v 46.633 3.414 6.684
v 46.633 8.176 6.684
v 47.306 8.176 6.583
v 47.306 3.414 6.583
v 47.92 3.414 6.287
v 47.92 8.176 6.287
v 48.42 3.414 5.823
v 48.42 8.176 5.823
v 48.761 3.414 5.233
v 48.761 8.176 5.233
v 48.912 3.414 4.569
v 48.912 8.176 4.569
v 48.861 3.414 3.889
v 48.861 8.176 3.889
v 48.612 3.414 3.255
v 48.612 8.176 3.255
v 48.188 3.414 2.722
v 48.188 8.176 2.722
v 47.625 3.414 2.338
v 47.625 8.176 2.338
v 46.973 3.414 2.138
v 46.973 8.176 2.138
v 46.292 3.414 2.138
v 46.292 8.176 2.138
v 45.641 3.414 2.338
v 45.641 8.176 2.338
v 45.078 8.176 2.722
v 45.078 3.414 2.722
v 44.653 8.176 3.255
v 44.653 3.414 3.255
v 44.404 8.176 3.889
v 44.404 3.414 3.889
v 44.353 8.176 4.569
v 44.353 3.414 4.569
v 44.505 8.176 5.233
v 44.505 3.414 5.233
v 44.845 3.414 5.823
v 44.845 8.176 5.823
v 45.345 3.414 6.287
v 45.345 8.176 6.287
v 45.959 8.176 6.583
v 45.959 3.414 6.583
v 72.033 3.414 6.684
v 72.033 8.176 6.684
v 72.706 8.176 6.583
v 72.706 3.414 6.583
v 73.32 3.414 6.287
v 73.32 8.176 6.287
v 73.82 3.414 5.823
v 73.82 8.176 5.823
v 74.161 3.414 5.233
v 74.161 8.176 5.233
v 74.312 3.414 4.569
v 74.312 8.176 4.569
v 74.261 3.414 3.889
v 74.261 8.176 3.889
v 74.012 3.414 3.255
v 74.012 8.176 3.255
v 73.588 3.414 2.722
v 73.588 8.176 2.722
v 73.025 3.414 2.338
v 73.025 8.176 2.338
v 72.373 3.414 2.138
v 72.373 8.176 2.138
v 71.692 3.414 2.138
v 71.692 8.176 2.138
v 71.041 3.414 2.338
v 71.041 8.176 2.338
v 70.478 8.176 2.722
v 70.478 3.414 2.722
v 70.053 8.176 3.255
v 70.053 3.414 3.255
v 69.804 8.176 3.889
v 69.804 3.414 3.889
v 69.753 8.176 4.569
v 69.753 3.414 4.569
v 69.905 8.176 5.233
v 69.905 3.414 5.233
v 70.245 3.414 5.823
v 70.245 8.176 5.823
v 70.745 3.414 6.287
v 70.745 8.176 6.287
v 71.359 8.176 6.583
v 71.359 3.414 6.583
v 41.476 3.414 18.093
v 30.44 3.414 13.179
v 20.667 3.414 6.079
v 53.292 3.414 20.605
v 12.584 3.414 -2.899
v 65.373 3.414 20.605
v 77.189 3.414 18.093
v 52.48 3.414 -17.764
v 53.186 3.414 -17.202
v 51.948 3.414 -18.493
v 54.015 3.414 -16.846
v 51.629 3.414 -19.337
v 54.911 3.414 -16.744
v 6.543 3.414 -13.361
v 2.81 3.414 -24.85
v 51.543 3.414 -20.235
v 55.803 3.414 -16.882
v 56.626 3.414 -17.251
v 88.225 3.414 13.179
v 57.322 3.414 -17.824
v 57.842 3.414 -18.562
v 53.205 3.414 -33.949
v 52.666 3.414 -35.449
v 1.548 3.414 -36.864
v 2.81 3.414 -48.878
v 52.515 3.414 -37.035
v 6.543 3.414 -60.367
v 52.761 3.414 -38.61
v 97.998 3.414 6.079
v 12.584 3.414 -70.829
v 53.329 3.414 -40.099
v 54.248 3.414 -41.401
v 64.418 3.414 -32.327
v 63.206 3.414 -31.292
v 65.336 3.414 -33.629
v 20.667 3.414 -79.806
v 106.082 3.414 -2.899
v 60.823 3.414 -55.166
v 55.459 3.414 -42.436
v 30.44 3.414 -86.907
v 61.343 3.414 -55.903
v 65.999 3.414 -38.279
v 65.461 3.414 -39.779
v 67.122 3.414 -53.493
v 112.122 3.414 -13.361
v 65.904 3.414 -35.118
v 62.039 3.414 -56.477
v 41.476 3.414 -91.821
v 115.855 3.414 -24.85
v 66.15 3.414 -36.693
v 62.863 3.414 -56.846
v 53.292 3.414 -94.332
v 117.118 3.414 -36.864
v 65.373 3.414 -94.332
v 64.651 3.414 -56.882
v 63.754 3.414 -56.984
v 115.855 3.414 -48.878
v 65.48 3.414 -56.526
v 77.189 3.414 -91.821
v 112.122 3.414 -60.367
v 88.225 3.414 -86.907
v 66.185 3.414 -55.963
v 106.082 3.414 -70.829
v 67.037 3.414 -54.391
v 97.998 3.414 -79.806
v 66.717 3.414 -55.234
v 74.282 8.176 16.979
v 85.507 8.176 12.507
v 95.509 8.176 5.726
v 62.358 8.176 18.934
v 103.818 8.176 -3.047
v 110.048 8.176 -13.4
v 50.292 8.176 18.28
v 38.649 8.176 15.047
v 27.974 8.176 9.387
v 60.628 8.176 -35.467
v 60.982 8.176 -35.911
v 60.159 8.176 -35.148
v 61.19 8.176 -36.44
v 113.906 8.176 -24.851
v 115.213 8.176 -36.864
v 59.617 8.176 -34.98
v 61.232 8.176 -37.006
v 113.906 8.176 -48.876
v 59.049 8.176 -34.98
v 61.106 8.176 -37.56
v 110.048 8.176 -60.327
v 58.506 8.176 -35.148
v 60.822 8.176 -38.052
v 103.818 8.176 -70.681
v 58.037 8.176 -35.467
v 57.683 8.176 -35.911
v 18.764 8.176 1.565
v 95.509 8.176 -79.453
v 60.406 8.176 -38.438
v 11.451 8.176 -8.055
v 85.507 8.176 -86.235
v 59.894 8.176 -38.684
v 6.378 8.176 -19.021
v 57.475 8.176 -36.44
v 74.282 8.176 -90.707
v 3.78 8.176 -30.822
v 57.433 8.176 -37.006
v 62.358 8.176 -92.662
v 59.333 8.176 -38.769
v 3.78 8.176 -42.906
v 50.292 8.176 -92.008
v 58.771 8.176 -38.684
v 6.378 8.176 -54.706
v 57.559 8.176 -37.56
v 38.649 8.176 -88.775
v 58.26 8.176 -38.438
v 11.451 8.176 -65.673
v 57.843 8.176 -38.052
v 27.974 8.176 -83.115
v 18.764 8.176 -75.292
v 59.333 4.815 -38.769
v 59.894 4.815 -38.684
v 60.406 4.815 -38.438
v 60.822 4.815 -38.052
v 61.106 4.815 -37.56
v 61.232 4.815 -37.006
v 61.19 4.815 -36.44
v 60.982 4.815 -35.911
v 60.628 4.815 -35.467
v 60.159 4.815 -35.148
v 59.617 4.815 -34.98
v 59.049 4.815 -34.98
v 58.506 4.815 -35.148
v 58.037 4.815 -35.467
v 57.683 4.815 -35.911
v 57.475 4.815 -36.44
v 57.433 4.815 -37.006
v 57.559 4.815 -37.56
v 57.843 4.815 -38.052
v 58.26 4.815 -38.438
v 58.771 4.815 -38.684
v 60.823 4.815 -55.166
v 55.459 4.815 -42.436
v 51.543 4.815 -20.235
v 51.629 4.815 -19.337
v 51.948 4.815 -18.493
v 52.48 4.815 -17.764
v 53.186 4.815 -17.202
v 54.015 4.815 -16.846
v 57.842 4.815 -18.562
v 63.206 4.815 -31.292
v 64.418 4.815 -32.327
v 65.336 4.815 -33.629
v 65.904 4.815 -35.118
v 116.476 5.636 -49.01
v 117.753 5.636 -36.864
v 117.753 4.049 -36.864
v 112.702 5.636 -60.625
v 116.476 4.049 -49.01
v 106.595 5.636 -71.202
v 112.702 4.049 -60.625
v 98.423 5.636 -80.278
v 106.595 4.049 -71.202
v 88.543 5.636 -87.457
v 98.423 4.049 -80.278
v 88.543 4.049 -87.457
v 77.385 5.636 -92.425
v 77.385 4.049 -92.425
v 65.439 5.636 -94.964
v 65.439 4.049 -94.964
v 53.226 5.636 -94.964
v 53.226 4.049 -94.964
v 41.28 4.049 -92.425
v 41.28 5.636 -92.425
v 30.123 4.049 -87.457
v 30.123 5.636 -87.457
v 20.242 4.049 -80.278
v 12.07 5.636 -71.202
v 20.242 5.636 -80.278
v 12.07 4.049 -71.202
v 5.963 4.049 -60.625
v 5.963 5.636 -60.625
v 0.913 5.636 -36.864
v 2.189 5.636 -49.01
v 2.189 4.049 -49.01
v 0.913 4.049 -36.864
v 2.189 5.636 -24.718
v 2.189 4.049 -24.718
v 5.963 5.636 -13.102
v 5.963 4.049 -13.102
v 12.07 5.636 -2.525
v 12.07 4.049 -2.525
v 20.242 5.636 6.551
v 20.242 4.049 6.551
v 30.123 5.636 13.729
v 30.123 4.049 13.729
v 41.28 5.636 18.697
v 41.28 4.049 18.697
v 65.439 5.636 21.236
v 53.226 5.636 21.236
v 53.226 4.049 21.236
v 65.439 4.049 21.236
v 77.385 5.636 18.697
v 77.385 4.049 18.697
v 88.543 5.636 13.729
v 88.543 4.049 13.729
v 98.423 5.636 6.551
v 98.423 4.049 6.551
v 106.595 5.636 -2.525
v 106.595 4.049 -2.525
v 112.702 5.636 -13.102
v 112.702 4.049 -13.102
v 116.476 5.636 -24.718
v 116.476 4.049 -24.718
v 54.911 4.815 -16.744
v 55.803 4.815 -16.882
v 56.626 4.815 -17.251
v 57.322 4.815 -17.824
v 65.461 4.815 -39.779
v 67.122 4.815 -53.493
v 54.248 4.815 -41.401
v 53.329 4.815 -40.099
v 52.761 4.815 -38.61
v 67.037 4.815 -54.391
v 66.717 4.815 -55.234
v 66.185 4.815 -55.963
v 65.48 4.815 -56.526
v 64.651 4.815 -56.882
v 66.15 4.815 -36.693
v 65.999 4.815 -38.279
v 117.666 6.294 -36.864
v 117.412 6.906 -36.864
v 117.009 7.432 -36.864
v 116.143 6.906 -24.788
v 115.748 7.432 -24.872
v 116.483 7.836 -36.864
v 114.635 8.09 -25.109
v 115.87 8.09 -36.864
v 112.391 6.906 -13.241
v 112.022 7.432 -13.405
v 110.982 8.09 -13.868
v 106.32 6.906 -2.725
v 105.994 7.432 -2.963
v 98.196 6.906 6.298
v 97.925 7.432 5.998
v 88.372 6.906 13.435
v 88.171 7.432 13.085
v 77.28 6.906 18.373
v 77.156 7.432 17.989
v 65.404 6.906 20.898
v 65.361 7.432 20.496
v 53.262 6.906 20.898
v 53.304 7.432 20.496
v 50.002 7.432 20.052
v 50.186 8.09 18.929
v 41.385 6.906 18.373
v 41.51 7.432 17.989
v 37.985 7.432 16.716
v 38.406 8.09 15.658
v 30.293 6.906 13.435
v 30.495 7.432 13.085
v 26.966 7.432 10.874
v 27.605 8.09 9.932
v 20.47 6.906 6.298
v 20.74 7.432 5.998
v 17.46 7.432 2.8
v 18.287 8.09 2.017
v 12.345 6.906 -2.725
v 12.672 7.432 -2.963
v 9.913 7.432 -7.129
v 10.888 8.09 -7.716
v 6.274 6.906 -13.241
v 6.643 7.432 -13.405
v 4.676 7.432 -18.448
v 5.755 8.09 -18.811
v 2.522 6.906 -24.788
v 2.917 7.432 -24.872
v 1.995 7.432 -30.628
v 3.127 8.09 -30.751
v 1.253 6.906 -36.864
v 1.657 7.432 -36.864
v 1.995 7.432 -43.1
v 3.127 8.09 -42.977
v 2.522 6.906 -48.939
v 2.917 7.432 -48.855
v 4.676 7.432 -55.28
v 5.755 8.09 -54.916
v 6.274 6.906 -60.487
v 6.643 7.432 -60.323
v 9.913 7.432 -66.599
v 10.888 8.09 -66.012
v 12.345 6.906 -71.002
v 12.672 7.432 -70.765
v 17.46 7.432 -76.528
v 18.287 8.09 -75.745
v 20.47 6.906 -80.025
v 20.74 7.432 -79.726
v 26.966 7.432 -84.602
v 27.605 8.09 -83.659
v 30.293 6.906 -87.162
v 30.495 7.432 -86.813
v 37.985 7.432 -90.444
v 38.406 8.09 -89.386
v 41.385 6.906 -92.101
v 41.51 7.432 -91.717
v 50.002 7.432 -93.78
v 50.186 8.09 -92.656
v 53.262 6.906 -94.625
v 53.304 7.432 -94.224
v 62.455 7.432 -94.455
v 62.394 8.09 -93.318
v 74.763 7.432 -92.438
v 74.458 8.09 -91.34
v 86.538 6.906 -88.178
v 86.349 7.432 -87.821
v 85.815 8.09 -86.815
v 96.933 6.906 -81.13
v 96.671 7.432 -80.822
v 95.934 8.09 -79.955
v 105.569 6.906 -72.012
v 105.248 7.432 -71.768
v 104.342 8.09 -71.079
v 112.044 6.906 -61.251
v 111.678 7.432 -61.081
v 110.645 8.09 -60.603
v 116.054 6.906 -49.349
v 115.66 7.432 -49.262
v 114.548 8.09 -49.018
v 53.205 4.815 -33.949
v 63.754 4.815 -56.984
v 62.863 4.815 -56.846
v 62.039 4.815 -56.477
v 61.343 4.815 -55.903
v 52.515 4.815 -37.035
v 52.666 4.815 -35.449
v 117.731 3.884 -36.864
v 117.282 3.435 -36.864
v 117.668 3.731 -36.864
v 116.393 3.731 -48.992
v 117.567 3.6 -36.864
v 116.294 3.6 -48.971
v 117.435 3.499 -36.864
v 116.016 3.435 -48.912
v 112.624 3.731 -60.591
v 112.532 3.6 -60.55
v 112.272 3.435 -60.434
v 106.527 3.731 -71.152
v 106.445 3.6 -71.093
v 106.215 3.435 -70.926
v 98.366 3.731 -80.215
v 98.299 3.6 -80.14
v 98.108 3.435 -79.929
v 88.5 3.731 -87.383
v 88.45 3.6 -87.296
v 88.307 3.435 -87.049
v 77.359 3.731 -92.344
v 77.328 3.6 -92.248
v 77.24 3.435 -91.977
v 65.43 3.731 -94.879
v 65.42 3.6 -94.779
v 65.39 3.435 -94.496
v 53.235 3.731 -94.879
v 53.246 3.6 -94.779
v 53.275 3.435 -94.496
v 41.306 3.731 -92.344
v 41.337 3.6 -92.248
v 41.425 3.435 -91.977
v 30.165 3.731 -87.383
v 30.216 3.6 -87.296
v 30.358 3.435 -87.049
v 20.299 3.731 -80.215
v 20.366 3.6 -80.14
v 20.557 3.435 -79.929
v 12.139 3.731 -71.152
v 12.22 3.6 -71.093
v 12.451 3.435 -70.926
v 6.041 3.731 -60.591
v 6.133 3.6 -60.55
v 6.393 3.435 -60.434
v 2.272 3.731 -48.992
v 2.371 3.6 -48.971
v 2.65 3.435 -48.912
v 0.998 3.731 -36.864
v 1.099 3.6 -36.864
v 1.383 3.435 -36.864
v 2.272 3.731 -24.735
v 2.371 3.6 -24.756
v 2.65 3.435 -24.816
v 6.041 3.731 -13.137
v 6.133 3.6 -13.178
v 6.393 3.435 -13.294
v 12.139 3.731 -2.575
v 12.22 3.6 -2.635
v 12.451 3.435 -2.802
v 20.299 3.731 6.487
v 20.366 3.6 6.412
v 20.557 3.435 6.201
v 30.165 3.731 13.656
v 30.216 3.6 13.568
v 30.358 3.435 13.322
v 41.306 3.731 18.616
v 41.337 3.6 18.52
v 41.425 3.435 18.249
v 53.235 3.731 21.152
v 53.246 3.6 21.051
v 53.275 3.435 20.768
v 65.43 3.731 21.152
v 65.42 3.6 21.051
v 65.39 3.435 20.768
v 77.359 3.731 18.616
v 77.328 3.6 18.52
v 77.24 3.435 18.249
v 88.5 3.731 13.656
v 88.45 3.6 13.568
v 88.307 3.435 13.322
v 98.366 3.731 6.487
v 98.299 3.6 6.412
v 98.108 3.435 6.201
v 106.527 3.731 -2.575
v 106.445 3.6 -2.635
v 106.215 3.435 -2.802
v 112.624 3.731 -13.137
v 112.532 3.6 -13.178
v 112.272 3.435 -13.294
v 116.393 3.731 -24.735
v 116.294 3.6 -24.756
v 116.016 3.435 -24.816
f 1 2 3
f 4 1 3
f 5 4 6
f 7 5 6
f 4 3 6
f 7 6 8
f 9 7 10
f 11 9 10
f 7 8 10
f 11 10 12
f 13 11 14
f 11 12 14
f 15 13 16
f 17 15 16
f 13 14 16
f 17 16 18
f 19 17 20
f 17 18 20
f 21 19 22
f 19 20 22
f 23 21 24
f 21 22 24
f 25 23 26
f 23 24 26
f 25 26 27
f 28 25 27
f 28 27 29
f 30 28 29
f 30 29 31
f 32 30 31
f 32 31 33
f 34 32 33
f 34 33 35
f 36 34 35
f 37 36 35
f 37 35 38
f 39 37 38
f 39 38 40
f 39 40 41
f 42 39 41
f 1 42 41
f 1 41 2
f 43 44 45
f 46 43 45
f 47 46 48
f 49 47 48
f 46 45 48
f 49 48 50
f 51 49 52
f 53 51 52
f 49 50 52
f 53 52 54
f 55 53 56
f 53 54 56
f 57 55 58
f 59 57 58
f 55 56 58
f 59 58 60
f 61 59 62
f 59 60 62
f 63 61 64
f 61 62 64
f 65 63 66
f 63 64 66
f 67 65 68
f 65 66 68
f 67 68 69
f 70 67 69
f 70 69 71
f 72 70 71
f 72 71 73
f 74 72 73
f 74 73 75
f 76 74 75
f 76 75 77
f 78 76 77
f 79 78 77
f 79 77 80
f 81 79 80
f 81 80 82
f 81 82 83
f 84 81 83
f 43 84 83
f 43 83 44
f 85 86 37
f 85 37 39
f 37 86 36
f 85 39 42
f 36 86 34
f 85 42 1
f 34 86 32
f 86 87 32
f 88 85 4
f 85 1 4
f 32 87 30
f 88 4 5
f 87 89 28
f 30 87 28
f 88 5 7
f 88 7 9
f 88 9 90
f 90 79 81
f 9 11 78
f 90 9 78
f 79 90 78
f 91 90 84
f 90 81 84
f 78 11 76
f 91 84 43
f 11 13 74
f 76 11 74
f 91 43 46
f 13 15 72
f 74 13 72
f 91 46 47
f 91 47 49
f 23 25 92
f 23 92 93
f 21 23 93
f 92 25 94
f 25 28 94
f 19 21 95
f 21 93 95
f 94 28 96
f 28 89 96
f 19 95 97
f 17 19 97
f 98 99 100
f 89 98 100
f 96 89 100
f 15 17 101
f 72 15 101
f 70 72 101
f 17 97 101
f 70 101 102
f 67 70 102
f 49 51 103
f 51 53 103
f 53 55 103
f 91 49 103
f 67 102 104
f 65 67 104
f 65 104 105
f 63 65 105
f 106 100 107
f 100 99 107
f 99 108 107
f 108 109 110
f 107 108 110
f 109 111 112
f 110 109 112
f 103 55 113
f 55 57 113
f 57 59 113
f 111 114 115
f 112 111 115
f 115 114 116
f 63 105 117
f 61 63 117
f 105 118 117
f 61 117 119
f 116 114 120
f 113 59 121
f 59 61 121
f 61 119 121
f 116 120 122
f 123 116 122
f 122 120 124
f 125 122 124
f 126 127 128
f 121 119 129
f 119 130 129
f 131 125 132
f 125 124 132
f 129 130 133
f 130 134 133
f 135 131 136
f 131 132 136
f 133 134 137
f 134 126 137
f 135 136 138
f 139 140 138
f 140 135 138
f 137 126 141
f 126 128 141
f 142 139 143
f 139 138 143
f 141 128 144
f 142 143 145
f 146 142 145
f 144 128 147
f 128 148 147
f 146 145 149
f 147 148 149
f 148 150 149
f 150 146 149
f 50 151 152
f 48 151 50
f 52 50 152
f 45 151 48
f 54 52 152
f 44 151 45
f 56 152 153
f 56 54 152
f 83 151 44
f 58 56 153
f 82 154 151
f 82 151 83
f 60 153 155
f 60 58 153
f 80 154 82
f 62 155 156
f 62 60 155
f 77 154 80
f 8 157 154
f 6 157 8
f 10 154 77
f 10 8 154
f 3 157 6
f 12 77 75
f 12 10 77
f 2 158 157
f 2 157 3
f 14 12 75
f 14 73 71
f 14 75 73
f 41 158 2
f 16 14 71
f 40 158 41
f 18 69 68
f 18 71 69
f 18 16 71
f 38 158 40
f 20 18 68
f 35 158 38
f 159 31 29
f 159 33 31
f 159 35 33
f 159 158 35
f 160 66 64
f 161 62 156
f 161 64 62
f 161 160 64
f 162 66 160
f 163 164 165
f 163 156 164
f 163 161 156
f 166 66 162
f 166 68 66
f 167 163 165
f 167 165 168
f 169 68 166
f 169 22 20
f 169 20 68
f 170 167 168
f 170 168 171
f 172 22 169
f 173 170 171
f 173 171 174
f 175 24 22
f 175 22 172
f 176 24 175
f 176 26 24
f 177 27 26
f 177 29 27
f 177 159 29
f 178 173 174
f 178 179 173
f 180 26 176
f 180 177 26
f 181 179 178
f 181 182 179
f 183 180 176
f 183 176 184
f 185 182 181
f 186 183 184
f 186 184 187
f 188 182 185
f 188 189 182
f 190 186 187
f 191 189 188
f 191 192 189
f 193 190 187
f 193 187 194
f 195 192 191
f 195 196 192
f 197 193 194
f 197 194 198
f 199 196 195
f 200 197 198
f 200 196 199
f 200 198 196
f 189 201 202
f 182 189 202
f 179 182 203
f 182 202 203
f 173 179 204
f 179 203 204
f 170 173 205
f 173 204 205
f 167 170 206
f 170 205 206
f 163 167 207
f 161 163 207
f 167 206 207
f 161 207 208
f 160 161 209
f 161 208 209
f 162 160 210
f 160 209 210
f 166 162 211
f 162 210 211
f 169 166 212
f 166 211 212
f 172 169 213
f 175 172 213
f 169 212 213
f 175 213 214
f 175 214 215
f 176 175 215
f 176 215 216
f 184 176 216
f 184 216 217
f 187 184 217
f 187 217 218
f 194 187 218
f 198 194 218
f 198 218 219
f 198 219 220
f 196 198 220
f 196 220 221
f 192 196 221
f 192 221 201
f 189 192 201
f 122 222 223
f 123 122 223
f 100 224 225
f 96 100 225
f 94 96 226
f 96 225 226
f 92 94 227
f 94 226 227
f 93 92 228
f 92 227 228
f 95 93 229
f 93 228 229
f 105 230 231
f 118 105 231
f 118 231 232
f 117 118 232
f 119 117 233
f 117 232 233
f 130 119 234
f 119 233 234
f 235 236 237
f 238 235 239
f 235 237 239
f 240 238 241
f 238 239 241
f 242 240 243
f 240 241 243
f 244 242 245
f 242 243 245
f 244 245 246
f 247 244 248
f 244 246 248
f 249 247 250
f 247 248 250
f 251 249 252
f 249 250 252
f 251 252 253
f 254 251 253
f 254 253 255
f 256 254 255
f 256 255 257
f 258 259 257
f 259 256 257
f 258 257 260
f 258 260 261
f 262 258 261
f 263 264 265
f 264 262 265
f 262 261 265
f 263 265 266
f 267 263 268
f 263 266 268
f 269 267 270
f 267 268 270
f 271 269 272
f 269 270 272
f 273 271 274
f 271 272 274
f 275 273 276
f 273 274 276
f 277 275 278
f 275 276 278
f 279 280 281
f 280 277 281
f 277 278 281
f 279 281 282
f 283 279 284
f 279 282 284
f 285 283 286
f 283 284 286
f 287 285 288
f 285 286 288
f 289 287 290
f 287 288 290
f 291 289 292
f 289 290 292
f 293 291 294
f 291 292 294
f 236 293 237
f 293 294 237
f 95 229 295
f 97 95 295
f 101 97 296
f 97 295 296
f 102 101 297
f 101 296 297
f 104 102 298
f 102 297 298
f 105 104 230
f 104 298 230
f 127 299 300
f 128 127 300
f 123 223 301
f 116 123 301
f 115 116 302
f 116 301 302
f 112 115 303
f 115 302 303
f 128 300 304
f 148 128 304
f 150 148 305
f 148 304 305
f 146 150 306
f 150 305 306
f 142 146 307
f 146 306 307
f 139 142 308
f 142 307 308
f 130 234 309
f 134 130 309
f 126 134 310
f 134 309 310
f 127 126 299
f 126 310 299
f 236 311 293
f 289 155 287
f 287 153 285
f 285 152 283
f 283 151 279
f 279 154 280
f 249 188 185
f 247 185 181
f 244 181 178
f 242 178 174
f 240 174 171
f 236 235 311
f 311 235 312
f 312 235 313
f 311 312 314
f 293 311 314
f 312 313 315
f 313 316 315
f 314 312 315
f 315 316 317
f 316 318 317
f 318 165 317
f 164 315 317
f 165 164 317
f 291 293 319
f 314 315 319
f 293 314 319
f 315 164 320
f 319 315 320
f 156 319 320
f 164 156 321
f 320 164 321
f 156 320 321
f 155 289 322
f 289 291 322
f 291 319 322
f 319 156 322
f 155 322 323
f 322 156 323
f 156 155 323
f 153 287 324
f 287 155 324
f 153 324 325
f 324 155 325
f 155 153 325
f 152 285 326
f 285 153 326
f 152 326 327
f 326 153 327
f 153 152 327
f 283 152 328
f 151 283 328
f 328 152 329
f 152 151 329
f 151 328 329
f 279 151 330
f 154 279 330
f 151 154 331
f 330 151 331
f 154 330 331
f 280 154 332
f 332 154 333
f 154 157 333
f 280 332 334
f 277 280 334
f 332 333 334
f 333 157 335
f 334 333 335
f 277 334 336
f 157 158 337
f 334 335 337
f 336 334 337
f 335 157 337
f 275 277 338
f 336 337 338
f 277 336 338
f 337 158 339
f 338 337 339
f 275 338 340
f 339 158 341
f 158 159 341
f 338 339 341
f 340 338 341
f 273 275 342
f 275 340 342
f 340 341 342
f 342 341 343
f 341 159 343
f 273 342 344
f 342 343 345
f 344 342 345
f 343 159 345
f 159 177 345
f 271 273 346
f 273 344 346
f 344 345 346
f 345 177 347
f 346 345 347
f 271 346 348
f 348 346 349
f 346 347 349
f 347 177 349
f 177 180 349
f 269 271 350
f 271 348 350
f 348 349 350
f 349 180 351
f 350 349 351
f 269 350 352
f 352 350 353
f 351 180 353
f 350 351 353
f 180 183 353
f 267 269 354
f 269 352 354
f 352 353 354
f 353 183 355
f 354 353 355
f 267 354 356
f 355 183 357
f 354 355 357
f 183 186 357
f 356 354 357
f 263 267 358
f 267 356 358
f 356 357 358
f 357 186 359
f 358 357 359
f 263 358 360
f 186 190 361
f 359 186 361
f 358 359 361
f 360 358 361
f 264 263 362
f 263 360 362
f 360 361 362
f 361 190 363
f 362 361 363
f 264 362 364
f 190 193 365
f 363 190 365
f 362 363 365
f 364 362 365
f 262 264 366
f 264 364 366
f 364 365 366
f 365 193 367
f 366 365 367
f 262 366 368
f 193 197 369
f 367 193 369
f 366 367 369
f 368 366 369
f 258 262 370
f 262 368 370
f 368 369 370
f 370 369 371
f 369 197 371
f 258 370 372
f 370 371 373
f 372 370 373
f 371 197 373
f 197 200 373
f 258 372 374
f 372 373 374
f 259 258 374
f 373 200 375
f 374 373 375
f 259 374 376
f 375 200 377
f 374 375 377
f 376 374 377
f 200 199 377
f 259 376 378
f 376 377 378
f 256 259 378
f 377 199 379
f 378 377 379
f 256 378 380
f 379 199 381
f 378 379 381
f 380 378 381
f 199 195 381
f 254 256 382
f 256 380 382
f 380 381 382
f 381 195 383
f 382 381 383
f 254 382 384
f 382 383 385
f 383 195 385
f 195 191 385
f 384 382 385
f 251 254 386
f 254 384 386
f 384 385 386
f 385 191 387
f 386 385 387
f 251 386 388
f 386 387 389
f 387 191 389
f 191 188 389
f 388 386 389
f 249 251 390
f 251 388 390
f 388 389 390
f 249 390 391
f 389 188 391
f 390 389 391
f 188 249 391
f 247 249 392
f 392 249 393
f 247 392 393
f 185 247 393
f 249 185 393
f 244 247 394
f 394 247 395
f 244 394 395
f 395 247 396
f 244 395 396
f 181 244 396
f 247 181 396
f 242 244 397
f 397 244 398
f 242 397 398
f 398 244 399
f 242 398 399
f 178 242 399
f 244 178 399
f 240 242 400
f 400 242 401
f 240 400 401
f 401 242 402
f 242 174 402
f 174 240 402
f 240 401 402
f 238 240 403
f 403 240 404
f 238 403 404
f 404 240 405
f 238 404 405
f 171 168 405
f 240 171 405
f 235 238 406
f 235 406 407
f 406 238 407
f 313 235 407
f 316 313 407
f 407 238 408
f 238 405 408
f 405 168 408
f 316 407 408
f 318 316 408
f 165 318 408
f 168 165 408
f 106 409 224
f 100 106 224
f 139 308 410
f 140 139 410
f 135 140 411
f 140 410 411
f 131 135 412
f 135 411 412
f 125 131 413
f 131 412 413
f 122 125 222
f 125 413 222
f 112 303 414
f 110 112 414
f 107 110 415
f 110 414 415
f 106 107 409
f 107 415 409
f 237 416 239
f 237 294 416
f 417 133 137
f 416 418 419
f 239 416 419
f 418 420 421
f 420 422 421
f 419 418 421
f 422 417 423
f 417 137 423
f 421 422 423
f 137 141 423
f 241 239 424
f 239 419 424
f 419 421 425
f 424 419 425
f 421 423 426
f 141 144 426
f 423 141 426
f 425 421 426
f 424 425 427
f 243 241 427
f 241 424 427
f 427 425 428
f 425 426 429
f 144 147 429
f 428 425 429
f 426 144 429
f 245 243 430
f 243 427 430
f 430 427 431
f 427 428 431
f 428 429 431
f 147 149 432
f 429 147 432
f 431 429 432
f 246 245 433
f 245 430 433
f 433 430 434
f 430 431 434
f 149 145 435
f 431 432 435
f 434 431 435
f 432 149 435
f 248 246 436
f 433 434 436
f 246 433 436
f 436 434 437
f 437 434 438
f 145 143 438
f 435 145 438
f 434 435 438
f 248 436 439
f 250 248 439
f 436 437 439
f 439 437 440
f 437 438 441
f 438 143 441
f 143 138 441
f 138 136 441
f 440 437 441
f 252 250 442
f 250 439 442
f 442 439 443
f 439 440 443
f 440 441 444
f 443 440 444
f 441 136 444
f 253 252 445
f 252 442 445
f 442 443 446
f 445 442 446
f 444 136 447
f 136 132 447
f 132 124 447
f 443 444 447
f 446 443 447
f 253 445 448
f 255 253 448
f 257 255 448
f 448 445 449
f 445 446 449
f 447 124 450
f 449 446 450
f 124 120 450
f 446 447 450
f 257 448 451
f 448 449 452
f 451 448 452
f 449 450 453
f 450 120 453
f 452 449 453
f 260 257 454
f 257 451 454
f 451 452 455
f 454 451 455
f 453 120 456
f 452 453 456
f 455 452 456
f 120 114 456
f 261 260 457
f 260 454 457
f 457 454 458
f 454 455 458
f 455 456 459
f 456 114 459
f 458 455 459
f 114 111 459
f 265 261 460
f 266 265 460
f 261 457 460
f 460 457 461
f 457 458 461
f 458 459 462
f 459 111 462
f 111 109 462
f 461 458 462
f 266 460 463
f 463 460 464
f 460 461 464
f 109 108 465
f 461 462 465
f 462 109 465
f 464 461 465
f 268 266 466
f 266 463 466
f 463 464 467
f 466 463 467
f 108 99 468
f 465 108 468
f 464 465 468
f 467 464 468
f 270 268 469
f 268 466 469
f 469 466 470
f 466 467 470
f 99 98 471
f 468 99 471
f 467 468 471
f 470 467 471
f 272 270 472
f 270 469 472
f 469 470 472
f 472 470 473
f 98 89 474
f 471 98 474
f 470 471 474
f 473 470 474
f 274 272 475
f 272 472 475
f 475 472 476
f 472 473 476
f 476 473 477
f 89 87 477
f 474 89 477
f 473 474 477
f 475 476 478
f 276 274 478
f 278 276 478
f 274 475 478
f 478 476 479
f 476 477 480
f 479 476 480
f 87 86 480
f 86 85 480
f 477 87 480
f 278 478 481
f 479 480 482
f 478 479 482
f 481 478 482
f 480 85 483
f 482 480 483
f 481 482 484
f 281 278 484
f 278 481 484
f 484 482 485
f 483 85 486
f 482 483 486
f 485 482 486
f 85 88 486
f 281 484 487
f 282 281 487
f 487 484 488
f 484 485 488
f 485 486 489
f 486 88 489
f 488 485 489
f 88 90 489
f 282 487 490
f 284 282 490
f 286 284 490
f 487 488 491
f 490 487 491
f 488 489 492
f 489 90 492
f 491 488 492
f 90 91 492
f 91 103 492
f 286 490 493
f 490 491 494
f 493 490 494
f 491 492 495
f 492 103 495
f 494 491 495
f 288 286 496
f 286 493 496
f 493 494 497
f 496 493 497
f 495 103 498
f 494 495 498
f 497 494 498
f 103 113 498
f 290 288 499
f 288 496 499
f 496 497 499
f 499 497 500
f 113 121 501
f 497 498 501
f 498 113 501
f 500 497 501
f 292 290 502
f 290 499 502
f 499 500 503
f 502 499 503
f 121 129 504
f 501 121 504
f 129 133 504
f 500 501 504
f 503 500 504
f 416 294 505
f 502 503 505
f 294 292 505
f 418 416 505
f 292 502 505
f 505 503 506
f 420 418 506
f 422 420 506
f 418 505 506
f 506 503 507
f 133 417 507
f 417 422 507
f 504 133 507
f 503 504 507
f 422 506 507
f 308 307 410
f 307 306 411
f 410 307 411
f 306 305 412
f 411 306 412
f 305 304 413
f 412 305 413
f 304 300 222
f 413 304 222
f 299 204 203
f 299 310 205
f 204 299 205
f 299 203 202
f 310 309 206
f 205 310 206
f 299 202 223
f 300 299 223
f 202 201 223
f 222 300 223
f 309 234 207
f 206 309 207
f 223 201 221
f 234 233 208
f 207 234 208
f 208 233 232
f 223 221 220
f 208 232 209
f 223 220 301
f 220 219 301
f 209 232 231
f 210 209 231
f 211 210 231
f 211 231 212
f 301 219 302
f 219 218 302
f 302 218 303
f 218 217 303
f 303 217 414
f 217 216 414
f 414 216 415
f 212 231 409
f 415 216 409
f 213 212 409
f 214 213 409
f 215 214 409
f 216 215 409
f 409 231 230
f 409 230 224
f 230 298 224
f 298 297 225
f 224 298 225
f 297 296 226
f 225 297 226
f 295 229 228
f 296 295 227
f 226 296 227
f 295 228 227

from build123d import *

# Parameters (mm, degrees)
COMBINE1_START         = 3.413749169
COMBINE1_OUTLINE_R     = 58.42
COMBINE1_OUTLINE_R_2   = 4.935
COMBINE1_OUTLINE_R_3   = 3.57
COMBINE1_OUTLINE_R_4   = 0.7875
COMBINE1_OUTLINE_R_5   = 3.15
COMBINE1_DEPTH         = 9.525
COMBINE1_START_2       = 4.053454325
COMBINE1_2_OUTLINE_R   = 0.7875
COMBINE1_2_OUTLINE_R_2 = 4.935
COMBINE1_2_OUTLINE_R_3 = 3.57
COMBINE1_2_OUTLINE_R_4 = 3.15
COMBINE1_2_DEPTH       = 8.885294844
CUT_EXTRUDE1_DEPTH     = 0.762
CUT_EXTRUDE2_START     = -4.7625
SKETCH4_R              = 58.42
CUT_EXTRUDE2_DEPTH     = 4.7625
CUT_EXTRUDE3_REACH     = 153.512
SKETCH7_R              = 1.905
FILLET2_R              = 2.54
FILLET5_R              = 0.635
SKETCH9_R              = 1.999996
CUT_EXTRUDE5_DEPTH     = 152.549922909
CUT_EXTRUDE6_REACH     = 153.55
SKETCH10_R             = 2.286
CUT_EXTRUDE9_REACH     = 153.512


with BuildPart() as part:
    # Combine1: read off the stored shape, not the designer's step
    # Combine1 outline → Combine1 (new body)
    # profile 1 of 11: a face of its own
    with BuildSketch(Plane(origin=(0, 0, 0), x_dir=(1, 0, 0), z_dir=(0, 1, 0)).offset(COMBINE1_START)):
        with Locations((59.332644984, 36.863851119)):
            Circle(COMBINE1_OUTLINE_R)
        with BuildLine():
            Line((55.998151143, 41.896996961), (61.361898263, 54.627286485))
            ThreePointArc((61.361898263, 54.627286485), (64.45492948, 56.145051848), (66.38688961, 53.292336674))
            Line((66.38688961, 53.292336674), (64.725431473, 39.578489242))
            ThreePointArc((64.725431473, 39.578489242), (65.167745205, 35.313686074), (62.667138826, 31.830705276))
            Line((62.667138826, 31.830705276), (57.303391705, 19.100415753))
            ThreePointArc((57.303391705, 19.100415753), (54.210360488, 17.58265039), (52.278400358, 20.435365564))
            Line((52.278400358, 20.435365564), (53.939858496, 34.149212996))
            ThreePointArc((53.939858496, 34.149212996), (53.32735594, 36.24102711), (53.497544764, 38.414016164))
            ThreePointArc((53.497544764, 38.414016164), (54.428243632, 40.384966514), (55.998151143, 41.896996961))
        make_face(mode=Mode.SUBTRACT)
    # profile 2 of 11: a face of its own
    with BuildSketch(Plane(origin=(0, 0, 0), x_dir=(1, 0, 0), z_dir=(0, 1, 0)).offset(COMBINE1_START)):
        with Locations((59.332644984, 36.863851119)):
            Circle(COMBINE1_OUTLINE_R_2)
        with Locations((59.332644984, 36.863851118)):
            Circle(COMBINE1_OUTLINE_R_3, mode=Mode.SUBTRACT)
    # profile 3 of 11: a face of its own
    with BuildSketch(Plane(origin=(0, 0, 0), x_dir=(1, 0, 0), z_dir=(0, 1, 0)).offset(COMBINE1_START)):
        with BuildLine():
            ThreePointArc((61.980902459, 43.765255947), (61.42199787, 44.728551416), (60.458702401, 44.169646828))
            ThreePointArc((60.458702401, 44.169646828), (61.01760699, 43.206351359), (61.980902459, 43.765255947))
        make_face()
    # profile 4 of 11: a face of its own
    with BuildSketch(Plane(origin=(0, 0, 0), x_dir=(1, 0, 0), z_dir=(0, 1, 0)).offset(COMBINE1_START)):
        with BuildLine():
            ThreePointArc((62.789684222, 46.809656062), (62.230779633, 47.772951531), (61.267484164, 47.214046943))
            ThreePointArc((61.267484164, 47.214046943), (61.826388753, 46.250751474), (62.789684222, 46.809656062))
        make_face()
    # profile 5 of 11: a face of its own
    with BuildSketch(Plane(origin=(0, 0, 0), x_dir=(1, 0, 0), z_dir=(0, 1, 0)).offset(COMBINE1_START)):
        with Locations((62.837365955, 50.056251617)):
            Circle(COMBINE1_OUTLINE_R_4)
    # profile 6 of 11: a face of its own
    with BuildSketch(Plane(origin=(0, 0, 0), x_dir=(1, 0, 0), z_dir=(0, 1, 0)).offset(COMBINE1_START)):
        with BuildLine():
            ThreePointArc((64.407247747, 52.898456292), (63.848343158, 53.861751761), (62.885047689, 53.302847173))
            ThreePointArc((62.885047689, 53.302847173), (63.443952278, 52.339551704), (64.407247747, 52.898456292))
        make_face()
    # profile 7 of 11: a face of its own
    with BuildSketch(Plane(origin=(0, 0, 0), x_dir=(1, 0, 0), z_dir=(0, 1, 0)).offset(COMBINE1_START)):
        with Locations((57.445487539, 29.76025085)):
            Circle(COMBINE1_OUTLINE_R_4)
    # profile 8 of 11: a face of its own
    with BuildSketch(Plane(origin=(0, 0, 0), x_dir=(1, 0, 0), z_dir=(0, 1, 0)).offset(COMBINE1_START)):
        with Locations((56.636705775, 26.715850735)):
            Circle(COMBINE1_OUTLINE_R_4)
    # profile 9 of 11: a face of its own
    with BuildSketch(Plane(origin=(0, 0, 0), x_dir=(1, 0, 0), z_dir=(0, 1, 0)).offset(COMBINE1_START)):
        with BuildLine():
            ThreePointArc((56.589024042, 23.46925518), (56.030119453, 24.432550649), (55.066823984, 23.873646061))
            ThreePointArc((55.066823984, 23.873646061), (55.625728573, 22.910350592), (56.589024042, 23.46925518))
        make_face()
    # profile 10 of 11: a face of its own
    with BuildSketch(Plane(origin=(0, 0, 0), x_dir=(1, 0, 0), z_dir=(0, 1, 0)).offset(COMBINE1_START)):
        with BuildLine():
            ThreePointArc((55.780242279, 20.424855065), (55.221337691, 21.388150534), (54.258042222, 20.829245946))
            ThreePointArc((54.258042222, 20.829245946), (54.81694681, 19.865950476), (55.780242279, 20.424855065))
        make_face()
    # profile 11 of 11: a face of its own
    with BuildSketch(Plane(origin=(0, 0, 0), x_dir=(1, 0, 0), z_dir=(0, 1, 0)).offset(COMBINE1_START)):
        with Locations((59.332644984, 36.863851119)):
            Circle(COMBINE1_OUTLINE_R_5)
    extrude(amount=COMBINE1_DEPTH)

    # Combine1 2 outline → Combine1 2 (add)
    # profile 1 of 2: a face of its own
    with BuildSketch(Plane(origin=(0, 0, 0), x_dir=(1, 0, 0), z_dir=(0, 1, 0)).offset(COMBINE1_START_2)):
        with BuildLine():
            ThreePointArc((66.38688961, 53.292336674), (64.45492948, 56.145051848), (61.361898263, 54.627286485))
            Line((61.361898263, 54.627286485), (55.998151143, 41.896996961))
            ThreePointArc((55.998151143, 41.896996961), (54.428243632, 40.384966514), (53.497544764, 38.414016164))
            ThreePointArc((53.497544764, 38.414016164), (53.32735594, 36.24102711), (53.939858496, 34.149212996))
            Line((53.939858496, 34.149212996), (52.278400358, 20.435365564))
            ThreePointArc((52.278400358, 20.435365564), (54.210360488, 17.58265039), (57.303391705, 19.100415753))
            Line((57.303391705, 19.100415753), (62.667138826, 31.830705276))
            ThreePointArc((62.667138826, 31.830705276), (65.167745205, 35.313686074), (64.725431473, 39.578489242))
            Line((64.725431473, 39.578489242), (66.38688961, 53.292336674))
        make_face()
        with BuildLine():
            ThreePointArc((55.780242279, 20.424855065), (54.81694681, 19.865950476), (54.258042222, 20.829245946))
            ThreePointArc((54.258042222, 20.829245946), (55.221337691, 21.388150534), (55.780242279, 20.424855065))
        make_face(mode=Mode.SUBTRACT)
        with BuildLine():
            ThreePointArc((56.589024042, 23.46925518), (55.625728573, 22.910350592), (55.066823984, 23.873646061))
            ThreePointArc((55.066823984, 23.873646061), (56.030119453, 24.432550649), (56.589024042, 23.46925518))
        make_face(mode=Mode.SUBTRACT)
        with Locations((56.636705775, 26.715850735)):
            Circle(COMBINE1_2_OUTLINE_R, mode=Mode.SUBTRACT)
        with Locations((57.445487539, 29.760250851)):
            Circle(COMBINE1_2_OUTLINE_R, mode=Mode.SUBTRACT)
        with Locations((59.332644984, 36.863851119)):
            Circle(COMBINE1_2_OUTLINE_R_2, mode=Mode.SUBTRACT)
        with BuildLine():
            ThreePointArc((61.980902459, 43.765255947), (61.01760699, 43.206351359), (60.458702401, 44.169646828))
            ThreePointArc((60.458702401, 44.169646828), (61.42199787, 44.728551416), (61.980902459, 43.765255947))
        make_face(mode=Mode.SUBTRACT)
        with BuildLine():
            ThreePointArc((62.789684222, 46.809656062), (61.826388753, 46.250751474), (61.267484164, 47.214046943))
            ThreePointArc((61.267484164, 47.214046943), (62.230779633, 47.772951531), (62.789684222, 46.809656062))
        make_face(mode=Mode.SUBTRACT)
        with Locations((62.837365955, 50.056251617)):
            Circle(COMBINE1_2_OUTLINE_R, mode=Mode.SUBTRACT)
        with BuildLine():
            ThreePointArc((64.407247747, 52.898456292), (63.443952278, 52.339551704), (62.885047689, 53.302847173))
            ThreePointArc((62.885047689, 53.302847173), (63.848343158, 53.861751761), (64.407247747, 52.898456292))
        make_face(mode=Mode.SUBTRACT)
    # profile 2 of 2: a face of its own
    with BuildSketch(Plane(origin=(0, 0, 0), x_dir=(1, 0, 0), z_dir=(0, 1, 0)).offset(COMBINE1_START_2)):
        with Locations((59.332644984, 36.863851118)):
            Circle(COMBINE1_2_OUTLINE_R_3)
        with Locations((59.332644984, 36.863851119)):
            Circle(COMBINE1_2_OUTLINE_R_4, mode=Mode.SUBTRACT)
    extrude(amount=COMBINE1_2_DEPTH)

    # Sketch1 → Cut-Extrude1 (cut, symmetric)
    with BuildSketch(Plane.XZ.offset(-4.053454325)):
        with BuildLine():
            Line((52.278400358, -20.435365564), (53.939858496, -34.149212996))
            ThreePointArc((53.939858496, -34.149212996), (53.497544764, -38.414016164), (55.998151143, -41.896996961))
            Line((55.998151143, -41.896996961), (61.361898263, -54.627286485))
            ThreePointArc((61.361898263, -54.627286485), (64.45492948, -56.145051848), (66.38688961, -53.292336674))
            Line((66.38688961, -53.292336674), (64.725431473, -39.578489242))
            ThreePointArc((64.725431473, -39.578489242), (65.167745205, -35.313686074), (62.667138826, -31.830705276))
            Line((62.667138826, -31.830705276), (57.303391705, -19.100415753))
            ThreePointArc((57.303391705, -19.100415753), (54.210360488, -17.58265039), (52.278400358, -20.435365564))
        make_face()
    extrude(amount=CUT_EXTRUDE1_DEPTH, both=True, mode=Mode.SUBTRACT)

    # Sketch4 → Cut-Extrude2 (cut)
    with BuildSketch(Plane(origin=(0, 12.938749169, 0), x_dir=(1, 0, 0), z_dir=(0, 1, 0)).offset(CUT_EXTRUDE2_START)):
        with Locations(Location((59.332644984, 36.863851119, 0), (0, 0, 90))):
            Circle(SKETCH4_R)
    extrude(amount=CUT_EXTRUDE2_DEPTH, mode=Mode.SUBTRACT)

    # Sketch7 → Cut-Extrude3 (cut, up to next)
    with BuildSketch(Plane.XZ.offset(-4.815454325), mode=Mode.PRIVATE) as cut_extrude3_sk1:
        with Locations(Location((59.332644984, -36.863851119, 0), (0, 0, 270))):
            Circle(SKETCH7_R)
    cut_extrude3_tool1 = extrude(cut_extrude3_sk1.sketch, amount=-CUT_EXTRUDE3_REACH, mode=Mode.PRIVATE) & part.part
    add(cut_extrude3_tool1.solids().sort_by_distance((59.332645, 4.815454, -36.863851))[0], mode=Mode.SUBTRACT)

    # Fillet2
    fillet2_edges = [part.edges().sort_by_distance(p)[0] for p in [
        (0.912644984, 8.176249169, -36.863851119),
    ]]
    fillet(fillet2_edges, radius=FILLET2_R)

    # Fillet5
    fillet5_edges = [part.edges().sort_by_distance(p)[0] for p in [
        (0.912644984, 3.413749169, -36.863851119),
    ]]
    fillet(fillet5_edges, radius=FILLET5_R)

    # Sketch9 → Cut-Extrude5 (cut, through all)
    with BuildSketch(Plane(origin=(0, 8.176249169, 0), x_dir=(1, 0, 0), z_dir=(0, 1, 0))):
        with Locations(Location((46.632644984, -4.398077679, 0), (0, 0, 270))):
            Circle(SKETCH9_R)
        with Locations(Location((72.032644984, -4.398077679, 0), (0, 0, 90))):
            Circle(SKETCH9_R)
    extrude(amount=-CUT_EXTRUDE5_DEPTH, mode=Mode.SUBTRACT)

    # Sketch10 → Cut-Extrude6 (cut, up to next)
    with BuildSketch(Plane(origin=(0, 8.176249169, 0), x_dir=(1, 0, 0), z_dir=(0, 1, 0)), mode=Mode.PRIVATE) as cut_extrude6_sk1:
        with Locations(Location((46.632644984, -4.398077679, 0), (0, 0, 270))):
            Circle(SKETCH10_R)
    cut_extrude6_tool1 = extrude(cut_extrude6_sk1.sketch, amount=-CUT_EXTRUDE6_REACH, mode=Mode.PRIVATE) & part.part
    # Sketch10 → Cut-Extrude6 (cut, up to next)
    with BuildSketch(Plane(origin=(0, 8.176249169, 0), x_dir=(1, 0, 0), z_dir=(0, 1, 0)), mode=Mode.PRIVATE) as cut_extrude6_sk2:
        with Locations(Location((72.032644984, -4.398077679, 0), (0, 0, 270))):
            Circle(SKETCH10_R)
    cut_extrude6_tool2 = extrude(cut_extrude6_sk2.sketch, amount=-CUT_EXTRUDE6_REACH, mode=Mode.PRIVATE) & part.part
    add(cut_extrude6_tool1.solids().sort_by_distance((46.632645, 8.176249, 4.398078))[0], mode=Mode.SUBTRACT)
    add(cut_extrude6_tool2.solids().sort_by_distance((72.032645, 8.176249, 4.398078))[0], mode=Mode.SUBTRACT)

    # Sketch11 → Cut-Extrude9 (cut, up to next)
    with BuildSketch(Plane.XZ.offset(-4.815454325), mode=Mode.PRIVATE) as cut_extrude9_sk1:
        with BuildLine():
            Line((60.823082896, -55.166101852), (55.459335776, -42.435812329))
            ThreePointArc((55.459335776, -42.435812329), (53.747699314, -40.778387244), (52.761089879, -38.609664323))
            ThreePointArc((52.761089879, -38.609664323), (52.541285954, -36.237230232), (53.204671891, -33.948851682))
            Line((53.204671891, -33.948851682), (51.543213753, -20.235004251))
            ThreePointArc((51.543213753, -20.235004251), (52.189851491, -18.110953809), (54.014712328, -16.846195505))
            ThreePointArc((54.014712328, -16.846195505), (56.22666621, -17.038525088), (57.842207073, -18.561600386))
            Line((57.842207073, -18.561600386), (63.205954193, -31.291889909))
            ThreePointArc((63.205954193, -31.291889909), (64.917590654, -32.949314993), (65.90420009, -35.118037914))
            ThreePointArc((65.90420009, -35.118037914), (66.124004014, -37.490472006), (65.460618078, -39.778850555))
            Line((65.460618078, -39.778850555), (67.122076215, -53.492697987))
            ThreePointArc((67.122076215, -53.492697987), (66.475438477, -55.616748428), (64.65057764, -56.881506733))
            ThreePointArc((64.65057764, -56.881506733), (62.438623759, -56.68917715), (60.823082896, -55.166101852))
        make_face()
    cut_extrude9_tool1 = extrude(cut_extrude9_sk1.sketch, amount=CUT_EXTRUDE9_REACH, mode=Mode.PRIVATE) & part.part
    add(cut_extrude9_tool1.solids().sort_by_distance((59.332645, 4.815454, -36.863851))[0], mode=Mode.SUBTRACT)


solid = part.part
